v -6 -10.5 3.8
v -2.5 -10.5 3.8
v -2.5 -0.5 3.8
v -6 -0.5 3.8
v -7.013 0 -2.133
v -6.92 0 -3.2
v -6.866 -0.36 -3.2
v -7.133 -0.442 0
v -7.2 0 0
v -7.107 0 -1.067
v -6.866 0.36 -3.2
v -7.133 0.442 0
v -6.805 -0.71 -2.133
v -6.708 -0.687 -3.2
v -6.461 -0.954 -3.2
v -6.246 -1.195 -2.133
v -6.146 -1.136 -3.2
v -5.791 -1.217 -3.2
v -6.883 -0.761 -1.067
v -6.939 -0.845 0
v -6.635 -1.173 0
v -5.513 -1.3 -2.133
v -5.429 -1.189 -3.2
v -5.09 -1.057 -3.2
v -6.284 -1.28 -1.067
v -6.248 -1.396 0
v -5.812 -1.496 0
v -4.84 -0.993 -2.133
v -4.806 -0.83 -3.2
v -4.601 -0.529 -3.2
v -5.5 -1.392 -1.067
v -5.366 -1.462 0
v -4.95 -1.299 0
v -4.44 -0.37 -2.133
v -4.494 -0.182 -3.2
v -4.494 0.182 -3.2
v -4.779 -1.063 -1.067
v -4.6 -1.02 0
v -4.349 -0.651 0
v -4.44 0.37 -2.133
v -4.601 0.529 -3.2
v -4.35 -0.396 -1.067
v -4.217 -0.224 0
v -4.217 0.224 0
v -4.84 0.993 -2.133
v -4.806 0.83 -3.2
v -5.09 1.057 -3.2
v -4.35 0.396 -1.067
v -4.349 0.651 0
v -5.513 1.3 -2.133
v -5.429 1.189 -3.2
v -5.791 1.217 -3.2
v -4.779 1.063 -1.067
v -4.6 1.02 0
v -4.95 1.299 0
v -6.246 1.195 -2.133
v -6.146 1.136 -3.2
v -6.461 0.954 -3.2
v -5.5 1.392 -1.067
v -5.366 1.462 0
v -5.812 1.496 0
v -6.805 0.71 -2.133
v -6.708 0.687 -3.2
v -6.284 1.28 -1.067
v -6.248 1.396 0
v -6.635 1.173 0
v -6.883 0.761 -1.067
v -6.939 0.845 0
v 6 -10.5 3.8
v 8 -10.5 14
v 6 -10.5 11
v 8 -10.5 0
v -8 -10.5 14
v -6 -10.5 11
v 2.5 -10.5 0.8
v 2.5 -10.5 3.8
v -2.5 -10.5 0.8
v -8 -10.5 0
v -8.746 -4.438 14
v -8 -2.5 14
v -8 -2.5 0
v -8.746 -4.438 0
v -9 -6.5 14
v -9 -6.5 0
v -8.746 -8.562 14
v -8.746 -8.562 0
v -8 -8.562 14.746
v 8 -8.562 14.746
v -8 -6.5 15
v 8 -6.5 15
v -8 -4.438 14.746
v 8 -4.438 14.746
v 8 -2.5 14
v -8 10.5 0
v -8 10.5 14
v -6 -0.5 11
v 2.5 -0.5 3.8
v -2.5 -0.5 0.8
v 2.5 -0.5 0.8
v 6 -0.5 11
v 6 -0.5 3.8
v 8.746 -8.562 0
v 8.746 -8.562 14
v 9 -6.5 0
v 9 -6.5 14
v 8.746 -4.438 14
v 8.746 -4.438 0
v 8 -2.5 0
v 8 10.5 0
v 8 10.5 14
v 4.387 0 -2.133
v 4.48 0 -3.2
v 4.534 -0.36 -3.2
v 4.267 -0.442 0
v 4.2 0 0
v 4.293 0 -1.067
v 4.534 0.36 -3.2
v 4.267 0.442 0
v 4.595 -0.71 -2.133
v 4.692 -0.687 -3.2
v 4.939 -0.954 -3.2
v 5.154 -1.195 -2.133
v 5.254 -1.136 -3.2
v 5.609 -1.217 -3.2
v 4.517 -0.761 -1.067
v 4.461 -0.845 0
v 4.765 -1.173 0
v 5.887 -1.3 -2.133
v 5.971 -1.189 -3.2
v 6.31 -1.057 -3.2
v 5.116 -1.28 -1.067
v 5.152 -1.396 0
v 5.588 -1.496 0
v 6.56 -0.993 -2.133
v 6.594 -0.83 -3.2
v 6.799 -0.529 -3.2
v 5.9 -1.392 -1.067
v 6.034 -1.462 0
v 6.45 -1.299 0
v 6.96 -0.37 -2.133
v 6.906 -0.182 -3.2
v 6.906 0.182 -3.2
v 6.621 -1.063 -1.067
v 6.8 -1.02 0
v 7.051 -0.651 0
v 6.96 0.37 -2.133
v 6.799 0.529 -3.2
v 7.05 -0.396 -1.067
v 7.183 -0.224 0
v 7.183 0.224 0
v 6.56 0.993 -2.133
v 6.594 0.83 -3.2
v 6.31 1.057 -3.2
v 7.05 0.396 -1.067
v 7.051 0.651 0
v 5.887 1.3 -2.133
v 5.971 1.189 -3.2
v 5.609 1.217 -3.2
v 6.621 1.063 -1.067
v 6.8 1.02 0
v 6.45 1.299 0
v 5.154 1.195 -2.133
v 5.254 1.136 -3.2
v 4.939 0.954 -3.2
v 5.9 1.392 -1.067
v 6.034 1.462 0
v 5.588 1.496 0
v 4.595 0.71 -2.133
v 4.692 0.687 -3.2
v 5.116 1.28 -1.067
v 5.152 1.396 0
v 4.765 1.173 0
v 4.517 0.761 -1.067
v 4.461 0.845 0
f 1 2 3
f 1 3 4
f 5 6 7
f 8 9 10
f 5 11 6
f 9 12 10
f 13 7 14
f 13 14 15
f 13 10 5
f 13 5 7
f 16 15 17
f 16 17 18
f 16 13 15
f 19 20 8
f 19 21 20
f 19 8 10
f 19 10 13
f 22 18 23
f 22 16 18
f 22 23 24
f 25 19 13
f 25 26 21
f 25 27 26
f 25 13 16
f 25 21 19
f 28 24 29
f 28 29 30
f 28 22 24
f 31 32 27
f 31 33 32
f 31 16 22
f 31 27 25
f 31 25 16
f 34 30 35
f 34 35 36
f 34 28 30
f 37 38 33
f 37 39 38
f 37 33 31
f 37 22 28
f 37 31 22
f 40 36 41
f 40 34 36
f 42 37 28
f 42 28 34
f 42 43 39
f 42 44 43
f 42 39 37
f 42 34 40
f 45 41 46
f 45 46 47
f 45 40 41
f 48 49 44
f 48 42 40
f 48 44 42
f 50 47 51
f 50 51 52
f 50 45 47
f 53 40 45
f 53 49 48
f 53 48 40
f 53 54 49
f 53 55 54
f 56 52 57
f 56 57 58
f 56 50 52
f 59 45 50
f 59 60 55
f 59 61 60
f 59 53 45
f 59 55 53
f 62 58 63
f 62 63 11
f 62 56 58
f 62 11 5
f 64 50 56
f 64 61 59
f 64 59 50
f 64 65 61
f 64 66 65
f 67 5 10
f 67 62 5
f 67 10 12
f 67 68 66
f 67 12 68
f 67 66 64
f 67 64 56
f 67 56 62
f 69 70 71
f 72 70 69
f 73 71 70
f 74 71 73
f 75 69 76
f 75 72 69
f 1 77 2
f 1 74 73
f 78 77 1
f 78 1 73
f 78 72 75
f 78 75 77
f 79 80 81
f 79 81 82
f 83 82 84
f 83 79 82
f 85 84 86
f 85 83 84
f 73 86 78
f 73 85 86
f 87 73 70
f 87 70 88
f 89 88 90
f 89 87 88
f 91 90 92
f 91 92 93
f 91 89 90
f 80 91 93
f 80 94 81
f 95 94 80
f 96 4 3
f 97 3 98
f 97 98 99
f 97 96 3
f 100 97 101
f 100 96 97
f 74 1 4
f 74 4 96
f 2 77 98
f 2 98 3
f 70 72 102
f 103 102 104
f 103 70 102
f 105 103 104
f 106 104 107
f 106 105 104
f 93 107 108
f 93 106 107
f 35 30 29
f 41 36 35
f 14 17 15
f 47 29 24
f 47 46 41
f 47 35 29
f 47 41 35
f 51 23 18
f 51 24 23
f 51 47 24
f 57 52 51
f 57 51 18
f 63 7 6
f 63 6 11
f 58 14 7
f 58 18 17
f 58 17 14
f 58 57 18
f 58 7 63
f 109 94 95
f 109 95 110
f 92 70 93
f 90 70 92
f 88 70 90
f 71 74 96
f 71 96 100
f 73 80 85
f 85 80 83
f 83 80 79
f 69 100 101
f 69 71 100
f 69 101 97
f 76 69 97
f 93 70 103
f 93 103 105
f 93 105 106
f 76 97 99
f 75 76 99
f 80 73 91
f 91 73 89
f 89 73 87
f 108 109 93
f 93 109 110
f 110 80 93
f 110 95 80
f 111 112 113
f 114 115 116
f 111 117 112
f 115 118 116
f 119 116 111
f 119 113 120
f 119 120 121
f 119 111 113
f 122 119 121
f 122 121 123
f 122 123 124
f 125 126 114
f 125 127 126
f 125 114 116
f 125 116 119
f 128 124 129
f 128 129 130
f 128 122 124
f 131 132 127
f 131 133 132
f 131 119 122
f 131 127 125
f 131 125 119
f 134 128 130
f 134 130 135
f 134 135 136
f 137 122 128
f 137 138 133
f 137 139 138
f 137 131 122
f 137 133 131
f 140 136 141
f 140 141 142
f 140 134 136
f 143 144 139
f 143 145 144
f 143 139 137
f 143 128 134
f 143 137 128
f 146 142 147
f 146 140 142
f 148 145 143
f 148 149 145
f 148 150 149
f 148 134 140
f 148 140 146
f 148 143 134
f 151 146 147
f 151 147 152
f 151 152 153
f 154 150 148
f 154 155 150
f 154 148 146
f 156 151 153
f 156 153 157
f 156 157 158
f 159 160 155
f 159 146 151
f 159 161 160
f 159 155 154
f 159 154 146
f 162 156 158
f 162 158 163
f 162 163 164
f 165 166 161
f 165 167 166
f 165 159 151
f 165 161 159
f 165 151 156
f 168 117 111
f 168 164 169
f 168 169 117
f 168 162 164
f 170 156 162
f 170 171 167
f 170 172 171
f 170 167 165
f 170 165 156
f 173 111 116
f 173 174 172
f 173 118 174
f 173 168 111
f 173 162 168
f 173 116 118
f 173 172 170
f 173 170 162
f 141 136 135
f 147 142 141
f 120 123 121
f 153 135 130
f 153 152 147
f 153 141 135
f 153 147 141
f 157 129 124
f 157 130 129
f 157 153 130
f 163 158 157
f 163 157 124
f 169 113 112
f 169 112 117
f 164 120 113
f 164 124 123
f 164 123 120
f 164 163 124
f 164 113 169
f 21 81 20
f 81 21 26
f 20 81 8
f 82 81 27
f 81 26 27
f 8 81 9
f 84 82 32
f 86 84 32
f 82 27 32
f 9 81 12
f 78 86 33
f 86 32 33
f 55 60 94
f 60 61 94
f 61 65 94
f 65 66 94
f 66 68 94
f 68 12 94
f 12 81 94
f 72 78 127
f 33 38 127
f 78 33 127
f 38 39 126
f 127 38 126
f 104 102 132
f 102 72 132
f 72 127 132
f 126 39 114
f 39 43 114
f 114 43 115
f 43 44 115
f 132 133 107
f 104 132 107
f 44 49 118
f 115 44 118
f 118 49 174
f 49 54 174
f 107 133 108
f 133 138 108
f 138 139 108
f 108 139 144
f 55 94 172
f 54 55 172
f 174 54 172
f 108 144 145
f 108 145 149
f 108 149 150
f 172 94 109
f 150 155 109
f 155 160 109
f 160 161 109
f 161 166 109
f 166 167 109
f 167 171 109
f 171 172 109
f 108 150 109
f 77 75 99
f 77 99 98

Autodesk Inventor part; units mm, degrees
ref_plane "YZ Plane" through (0, 0, 0) normal (1, 0, 0) x (0, 1, 0)
ref_plane "XZ Plane" through (0, 0, 0) normal (0, 1, 0) x (-1, 0, 0)
ref_plane "XY Plane" through (0, 0, 0) normal (0, 0, 1) x (1, 0, 0)
sketch "Skizze1" plane through (0, 0, 0) normal (0, 0, 1) x (1, 0, 0)
  line L0 (-8, 10.5) -> (8, 10.5)
  line L1 (8, 10.5) -> (8, -10.5)
  line L2 (8, -10.5) -> (-8, -10.5)
  line L3 (-8, -10.5) -> (-8, 10.5)
  line L4 (0, 14.7) -> (0, -14.7) projected
  line L5 (-11.2, 0) -> (11.2, 0) projected
  point P0 (0, 0)
  dimension "d0" = 16
  dimension "d2" = 21
extrude "Extrusion1" add sketch "Skizze1" along normal blind 14
sketch "Skizze2" plane through (-8, -10.5, 0) normal (0, -1, 0) x (1, 0, 0)
  line L0 (2, 11) -> (14, 11)
  line L1 (14, 11) -> (14, 3.8)
  line L2 (2, 3.8) -> (2, 11)
  line L3 (10.5, 3.8) -> (10.5, 0.8)
  line L4 (10.5, 0.8) -> (5.5, 0.8)
  line L5 (5.5, 0.8) -> (5.5, 3.8)
  line L6 (16, 0) -> (0, 0) projected
  line L7 (16, 0) -> (16, 14) projected
  line L8 (0, 14) -> (16, 14) projected
  line L9 (0, 0) -> (0, 14) projected
  line L10 (8, 14) -> (8, 0) construction
  line L11 (14, 3.8) -> (10.5, 3.8)
  line L12 (5.5, 3.8) -> (2, 3.8)
  dimension "d5" = 3
  dimension "d6" = 0.8
  dimension "d8" = 2
  dimension "d9" = 5
  dimension "d10" = 3
extrude "Extrusion2" cut sketch "Skizze2" against normal blind 10 contours L0 L1 L11 L3 L4 L5 L12 L2
sketch "Skizze3" plane through (0, 0, 0) normal (0, 0, -1) x (-1, 0, 0)
  line L0 (-8, -10.5) -> (8, -10.5) projected
  line L1 (-8, 10.5) -> (-8, -10.5) projected
  line L2 (8, -10.5) -> (8, 10.5) projected
  line L3 (-5.7, 0) -> (5.7, 0) construction
  line L4 (0, -14.7) -> (0, 14.7) construction
  circle A0 centre (-5.7, 0) radius 1.5
  circle A1 centre (5.7, 0) radius 1.5
  point P0 (0, 0)
  dimension "d13" = 10.5
  dimension "d14" = 11.4
  dimension "d15" = 3
  dimension "d16" = 3
extrude "Extrusion3" add sketch "Skizze3" along normal blind 3.2 draft -5
sketch "Skizze4" plane through (-8, -10.5, 0) normal (-1, 0, 0) x (0, 0, 1)
  line L0 (14, 21) -> (14, 0) projected
  arc A0 (14, 0) -> (14, 8) centre (6.5, 4) ccw
  line L1 (14, 0) -> (14, 8)
  point P0 (0, 10.5)
  dimension "d19" = 1
  dimension "d20" = 8
extrude "Extrusion4" add sketch "Skizze4" against normal blind 16
sketch "Skizze5" plane through (0, 0, 14) normal (0, 0, 1) x (1, 0, 0)
  line L0 (-8, 10.5) -> (-8, -10.5) projected
  line L1 (8, -10.5) -> (8, 10.5) projected
  arc A0 (-8, -2.5) -> (-8, -10.5) centre (-0.5, -6.5) ccw
  line L2 (-8, -10.5) -> (-8, -2.5)
  point P0 (0, 0)
  dimension "d23" = 1
  dimension "d24" = 8
extrude "Extrusion5" add sketch "Skizze5" against normal blind 14
mirror "Spiegeln1" about plane through (0, 0, 0) normal (1, 0, 0) of "Extrusion5"
properties part number "RJ45 Socket" material "Aluminium 6061"
